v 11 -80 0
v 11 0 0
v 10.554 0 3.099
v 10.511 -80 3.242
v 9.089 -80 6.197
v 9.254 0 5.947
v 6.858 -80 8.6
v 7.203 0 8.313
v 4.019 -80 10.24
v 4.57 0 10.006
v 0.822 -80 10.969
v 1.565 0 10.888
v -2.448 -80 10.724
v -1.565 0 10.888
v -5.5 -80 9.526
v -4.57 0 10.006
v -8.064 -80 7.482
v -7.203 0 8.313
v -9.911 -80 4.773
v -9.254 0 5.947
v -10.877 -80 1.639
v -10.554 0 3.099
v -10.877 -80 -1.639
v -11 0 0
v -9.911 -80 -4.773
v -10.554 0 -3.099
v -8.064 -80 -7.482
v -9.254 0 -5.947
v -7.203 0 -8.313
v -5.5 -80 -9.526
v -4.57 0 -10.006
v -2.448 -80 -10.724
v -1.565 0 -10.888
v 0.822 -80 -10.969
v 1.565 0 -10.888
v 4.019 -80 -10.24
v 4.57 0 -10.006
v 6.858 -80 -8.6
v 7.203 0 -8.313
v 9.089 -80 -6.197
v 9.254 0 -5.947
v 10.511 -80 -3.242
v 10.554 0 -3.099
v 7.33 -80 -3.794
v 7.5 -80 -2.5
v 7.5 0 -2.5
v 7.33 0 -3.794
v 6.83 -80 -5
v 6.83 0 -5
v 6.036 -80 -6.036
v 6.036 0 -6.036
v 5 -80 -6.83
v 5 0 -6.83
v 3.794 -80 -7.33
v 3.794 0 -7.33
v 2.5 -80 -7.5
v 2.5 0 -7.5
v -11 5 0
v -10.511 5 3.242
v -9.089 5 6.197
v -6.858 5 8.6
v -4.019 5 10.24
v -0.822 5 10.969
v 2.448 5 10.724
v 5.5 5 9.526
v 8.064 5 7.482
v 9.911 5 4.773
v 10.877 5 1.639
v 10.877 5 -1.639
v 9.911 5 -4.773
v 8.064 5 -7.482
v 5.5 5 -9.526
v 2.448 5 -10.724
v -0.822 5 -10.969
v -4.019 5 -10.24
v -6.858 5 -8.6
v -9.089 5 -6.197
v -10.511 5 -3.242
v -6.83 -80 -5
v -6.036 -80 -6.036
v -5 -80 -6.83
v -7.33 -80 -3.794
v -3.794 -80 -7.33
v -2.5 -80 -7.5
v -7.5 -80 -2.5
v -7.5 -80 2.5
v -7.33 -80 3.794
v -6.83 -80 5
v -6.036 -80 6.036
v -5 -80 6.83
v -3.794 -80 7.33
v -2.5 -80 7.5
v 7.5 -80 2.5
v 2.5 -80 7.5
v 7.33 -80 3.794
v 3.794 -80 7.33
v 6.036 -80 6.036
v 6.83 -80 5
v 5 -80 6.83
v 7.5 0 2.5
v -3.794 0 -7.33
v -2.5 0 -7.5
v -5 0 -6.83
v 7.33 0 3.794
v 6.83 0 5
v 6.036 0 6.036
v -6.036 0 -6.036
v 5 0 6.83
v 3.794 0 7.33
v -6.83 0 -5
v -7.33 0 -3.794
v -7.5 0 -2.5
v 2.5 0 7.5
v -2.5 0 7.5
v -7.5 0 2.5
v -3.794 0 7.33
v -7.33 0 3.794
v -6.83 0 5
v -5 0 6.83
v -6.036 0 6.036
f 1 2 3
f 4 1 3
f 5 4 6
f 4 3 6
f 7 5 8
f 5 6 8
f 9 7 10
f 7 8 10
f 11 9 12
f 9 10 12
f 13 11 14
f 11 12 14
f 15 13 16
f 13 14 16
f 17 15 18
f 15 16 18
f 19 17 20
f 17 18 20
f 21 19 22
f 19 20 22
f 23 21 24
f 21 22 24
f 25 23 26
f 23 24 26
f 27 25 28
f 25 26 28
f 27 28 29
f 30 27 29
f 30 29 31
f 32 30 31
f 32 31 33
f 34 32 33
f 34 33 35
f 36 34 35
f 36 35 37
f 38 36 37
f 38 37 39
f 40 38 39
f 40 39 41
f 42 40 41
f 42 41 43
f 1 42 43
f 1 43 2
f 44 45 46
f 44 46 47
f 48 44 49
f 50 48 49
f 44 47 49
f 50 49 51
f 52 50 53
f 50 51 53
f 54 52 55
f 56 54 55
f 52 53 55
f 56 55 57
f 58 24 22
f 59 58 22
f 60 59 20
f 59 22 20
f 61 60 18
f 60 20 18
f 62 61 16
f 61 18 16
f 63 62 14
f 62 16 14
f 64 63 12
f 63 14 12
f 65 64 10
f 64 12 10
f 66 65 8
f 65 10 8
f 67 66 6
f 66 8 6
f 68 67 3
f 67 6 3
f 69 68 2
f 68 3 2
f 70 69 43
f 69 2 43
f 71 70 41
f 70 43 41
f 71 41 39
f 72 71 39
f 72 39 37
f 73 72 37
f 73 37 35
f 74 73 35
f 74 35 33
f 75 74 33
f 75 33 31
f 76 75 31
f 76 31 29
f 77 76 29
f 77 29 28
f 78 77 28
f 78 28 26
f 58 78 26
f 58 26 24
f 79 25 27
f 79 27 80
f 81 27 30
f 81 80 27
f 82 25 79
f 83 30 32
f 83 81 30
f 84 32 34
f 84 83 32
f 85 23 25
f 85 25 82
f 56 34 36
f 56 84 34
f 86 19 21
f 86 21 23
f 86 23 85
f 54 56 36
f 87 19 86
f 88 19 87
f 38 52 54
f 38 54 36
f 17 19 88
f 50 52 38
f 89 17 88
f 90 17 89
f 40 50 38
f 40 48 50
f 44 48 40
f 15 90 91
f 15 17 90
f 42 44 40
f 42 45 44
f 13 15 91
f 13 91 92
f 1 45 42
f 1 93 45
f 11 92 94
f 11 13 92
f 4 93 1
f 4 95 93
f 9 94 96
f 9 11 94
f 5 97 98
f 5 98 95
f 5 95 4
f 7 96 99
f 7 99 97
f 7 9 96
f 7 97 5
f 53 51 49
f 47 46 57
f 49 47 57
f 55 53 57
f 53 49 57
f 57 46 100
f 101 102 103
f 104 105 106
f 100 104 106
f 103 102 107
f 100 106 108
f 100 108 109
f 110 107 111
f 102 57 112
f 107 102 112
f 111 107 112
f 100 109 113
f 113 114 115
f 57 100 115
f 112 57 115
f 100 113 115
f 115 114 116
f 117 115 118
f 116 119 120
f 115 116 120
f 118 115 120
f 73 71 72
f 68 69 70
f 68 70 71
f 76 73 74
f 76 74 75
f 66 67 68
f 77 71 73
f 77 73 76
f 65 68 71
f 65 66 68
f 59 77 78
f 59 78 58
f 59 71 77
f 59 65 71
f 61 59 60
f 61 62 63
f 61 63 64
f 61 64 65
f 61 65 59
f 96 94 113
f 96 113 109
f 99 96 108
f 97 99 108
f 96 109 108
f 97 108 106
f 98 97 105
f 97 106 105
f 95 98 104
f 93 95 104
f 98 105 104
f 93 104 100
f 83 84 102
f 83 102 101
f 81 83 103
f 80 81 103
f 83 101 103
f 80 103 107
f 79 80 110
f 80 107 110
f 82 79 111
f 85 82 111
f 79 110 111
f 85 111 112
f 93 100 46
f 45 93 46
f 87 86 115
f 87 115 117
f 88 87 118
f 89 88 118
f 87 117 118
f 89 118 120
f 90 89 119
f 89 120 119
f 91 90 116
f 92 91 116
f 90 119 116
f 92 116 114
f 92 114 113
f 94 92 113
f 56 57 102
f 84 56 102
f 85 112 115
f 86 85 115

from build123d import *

# Parameters (mm, degrees)
F0_R     = 11
F1_DEPTH = 80
F2_R     = 11
F3_DEPTH = 5


with BuildPart() as f1:
    # F0 (on Front) → F1 (new body)
    with BuildSketch(Plane.XZ):
        Circle(F0_R)
        with BuildLine():
            Line((-2.5, 7.5), (2.5, 7.5))
            ThreePointArc((2.5, 7.5), (6.035534, 6.035534), (7.5, 2.5))
            Line((7.5, 2.5), (7.5, -2.5))
            ThreePointArc((7.5, -2.5), (6.035534, -6.035534), (2.5, -7.5))
            Line((2.5, -7.5), (-2.5, -7.5))
            ThreePointArc((-2.5, -7.5), (-6.035534, -6.035534), (-7.5, -2.5))
            Line((-7.5, -2.5), (-7.5, 2.5))
            ThreePointArc((-7.5, 2.5), (-6.035534, 6.035534), (-2.5, 7.5))
        make_face(mode=Mode.SUBTRACT)
    extrude(amount=F1_DEPTH)

    # F2 (on face) → F3 (join)
    with BuildSketch(Plane(origin=(0, 0, 0), x_dir=(-1, 0, 0), z_dir=(0, 1, 0))):
        Circle(F2_R)
    extrude(amount=F3_DEPTH)


solid = f1.part
